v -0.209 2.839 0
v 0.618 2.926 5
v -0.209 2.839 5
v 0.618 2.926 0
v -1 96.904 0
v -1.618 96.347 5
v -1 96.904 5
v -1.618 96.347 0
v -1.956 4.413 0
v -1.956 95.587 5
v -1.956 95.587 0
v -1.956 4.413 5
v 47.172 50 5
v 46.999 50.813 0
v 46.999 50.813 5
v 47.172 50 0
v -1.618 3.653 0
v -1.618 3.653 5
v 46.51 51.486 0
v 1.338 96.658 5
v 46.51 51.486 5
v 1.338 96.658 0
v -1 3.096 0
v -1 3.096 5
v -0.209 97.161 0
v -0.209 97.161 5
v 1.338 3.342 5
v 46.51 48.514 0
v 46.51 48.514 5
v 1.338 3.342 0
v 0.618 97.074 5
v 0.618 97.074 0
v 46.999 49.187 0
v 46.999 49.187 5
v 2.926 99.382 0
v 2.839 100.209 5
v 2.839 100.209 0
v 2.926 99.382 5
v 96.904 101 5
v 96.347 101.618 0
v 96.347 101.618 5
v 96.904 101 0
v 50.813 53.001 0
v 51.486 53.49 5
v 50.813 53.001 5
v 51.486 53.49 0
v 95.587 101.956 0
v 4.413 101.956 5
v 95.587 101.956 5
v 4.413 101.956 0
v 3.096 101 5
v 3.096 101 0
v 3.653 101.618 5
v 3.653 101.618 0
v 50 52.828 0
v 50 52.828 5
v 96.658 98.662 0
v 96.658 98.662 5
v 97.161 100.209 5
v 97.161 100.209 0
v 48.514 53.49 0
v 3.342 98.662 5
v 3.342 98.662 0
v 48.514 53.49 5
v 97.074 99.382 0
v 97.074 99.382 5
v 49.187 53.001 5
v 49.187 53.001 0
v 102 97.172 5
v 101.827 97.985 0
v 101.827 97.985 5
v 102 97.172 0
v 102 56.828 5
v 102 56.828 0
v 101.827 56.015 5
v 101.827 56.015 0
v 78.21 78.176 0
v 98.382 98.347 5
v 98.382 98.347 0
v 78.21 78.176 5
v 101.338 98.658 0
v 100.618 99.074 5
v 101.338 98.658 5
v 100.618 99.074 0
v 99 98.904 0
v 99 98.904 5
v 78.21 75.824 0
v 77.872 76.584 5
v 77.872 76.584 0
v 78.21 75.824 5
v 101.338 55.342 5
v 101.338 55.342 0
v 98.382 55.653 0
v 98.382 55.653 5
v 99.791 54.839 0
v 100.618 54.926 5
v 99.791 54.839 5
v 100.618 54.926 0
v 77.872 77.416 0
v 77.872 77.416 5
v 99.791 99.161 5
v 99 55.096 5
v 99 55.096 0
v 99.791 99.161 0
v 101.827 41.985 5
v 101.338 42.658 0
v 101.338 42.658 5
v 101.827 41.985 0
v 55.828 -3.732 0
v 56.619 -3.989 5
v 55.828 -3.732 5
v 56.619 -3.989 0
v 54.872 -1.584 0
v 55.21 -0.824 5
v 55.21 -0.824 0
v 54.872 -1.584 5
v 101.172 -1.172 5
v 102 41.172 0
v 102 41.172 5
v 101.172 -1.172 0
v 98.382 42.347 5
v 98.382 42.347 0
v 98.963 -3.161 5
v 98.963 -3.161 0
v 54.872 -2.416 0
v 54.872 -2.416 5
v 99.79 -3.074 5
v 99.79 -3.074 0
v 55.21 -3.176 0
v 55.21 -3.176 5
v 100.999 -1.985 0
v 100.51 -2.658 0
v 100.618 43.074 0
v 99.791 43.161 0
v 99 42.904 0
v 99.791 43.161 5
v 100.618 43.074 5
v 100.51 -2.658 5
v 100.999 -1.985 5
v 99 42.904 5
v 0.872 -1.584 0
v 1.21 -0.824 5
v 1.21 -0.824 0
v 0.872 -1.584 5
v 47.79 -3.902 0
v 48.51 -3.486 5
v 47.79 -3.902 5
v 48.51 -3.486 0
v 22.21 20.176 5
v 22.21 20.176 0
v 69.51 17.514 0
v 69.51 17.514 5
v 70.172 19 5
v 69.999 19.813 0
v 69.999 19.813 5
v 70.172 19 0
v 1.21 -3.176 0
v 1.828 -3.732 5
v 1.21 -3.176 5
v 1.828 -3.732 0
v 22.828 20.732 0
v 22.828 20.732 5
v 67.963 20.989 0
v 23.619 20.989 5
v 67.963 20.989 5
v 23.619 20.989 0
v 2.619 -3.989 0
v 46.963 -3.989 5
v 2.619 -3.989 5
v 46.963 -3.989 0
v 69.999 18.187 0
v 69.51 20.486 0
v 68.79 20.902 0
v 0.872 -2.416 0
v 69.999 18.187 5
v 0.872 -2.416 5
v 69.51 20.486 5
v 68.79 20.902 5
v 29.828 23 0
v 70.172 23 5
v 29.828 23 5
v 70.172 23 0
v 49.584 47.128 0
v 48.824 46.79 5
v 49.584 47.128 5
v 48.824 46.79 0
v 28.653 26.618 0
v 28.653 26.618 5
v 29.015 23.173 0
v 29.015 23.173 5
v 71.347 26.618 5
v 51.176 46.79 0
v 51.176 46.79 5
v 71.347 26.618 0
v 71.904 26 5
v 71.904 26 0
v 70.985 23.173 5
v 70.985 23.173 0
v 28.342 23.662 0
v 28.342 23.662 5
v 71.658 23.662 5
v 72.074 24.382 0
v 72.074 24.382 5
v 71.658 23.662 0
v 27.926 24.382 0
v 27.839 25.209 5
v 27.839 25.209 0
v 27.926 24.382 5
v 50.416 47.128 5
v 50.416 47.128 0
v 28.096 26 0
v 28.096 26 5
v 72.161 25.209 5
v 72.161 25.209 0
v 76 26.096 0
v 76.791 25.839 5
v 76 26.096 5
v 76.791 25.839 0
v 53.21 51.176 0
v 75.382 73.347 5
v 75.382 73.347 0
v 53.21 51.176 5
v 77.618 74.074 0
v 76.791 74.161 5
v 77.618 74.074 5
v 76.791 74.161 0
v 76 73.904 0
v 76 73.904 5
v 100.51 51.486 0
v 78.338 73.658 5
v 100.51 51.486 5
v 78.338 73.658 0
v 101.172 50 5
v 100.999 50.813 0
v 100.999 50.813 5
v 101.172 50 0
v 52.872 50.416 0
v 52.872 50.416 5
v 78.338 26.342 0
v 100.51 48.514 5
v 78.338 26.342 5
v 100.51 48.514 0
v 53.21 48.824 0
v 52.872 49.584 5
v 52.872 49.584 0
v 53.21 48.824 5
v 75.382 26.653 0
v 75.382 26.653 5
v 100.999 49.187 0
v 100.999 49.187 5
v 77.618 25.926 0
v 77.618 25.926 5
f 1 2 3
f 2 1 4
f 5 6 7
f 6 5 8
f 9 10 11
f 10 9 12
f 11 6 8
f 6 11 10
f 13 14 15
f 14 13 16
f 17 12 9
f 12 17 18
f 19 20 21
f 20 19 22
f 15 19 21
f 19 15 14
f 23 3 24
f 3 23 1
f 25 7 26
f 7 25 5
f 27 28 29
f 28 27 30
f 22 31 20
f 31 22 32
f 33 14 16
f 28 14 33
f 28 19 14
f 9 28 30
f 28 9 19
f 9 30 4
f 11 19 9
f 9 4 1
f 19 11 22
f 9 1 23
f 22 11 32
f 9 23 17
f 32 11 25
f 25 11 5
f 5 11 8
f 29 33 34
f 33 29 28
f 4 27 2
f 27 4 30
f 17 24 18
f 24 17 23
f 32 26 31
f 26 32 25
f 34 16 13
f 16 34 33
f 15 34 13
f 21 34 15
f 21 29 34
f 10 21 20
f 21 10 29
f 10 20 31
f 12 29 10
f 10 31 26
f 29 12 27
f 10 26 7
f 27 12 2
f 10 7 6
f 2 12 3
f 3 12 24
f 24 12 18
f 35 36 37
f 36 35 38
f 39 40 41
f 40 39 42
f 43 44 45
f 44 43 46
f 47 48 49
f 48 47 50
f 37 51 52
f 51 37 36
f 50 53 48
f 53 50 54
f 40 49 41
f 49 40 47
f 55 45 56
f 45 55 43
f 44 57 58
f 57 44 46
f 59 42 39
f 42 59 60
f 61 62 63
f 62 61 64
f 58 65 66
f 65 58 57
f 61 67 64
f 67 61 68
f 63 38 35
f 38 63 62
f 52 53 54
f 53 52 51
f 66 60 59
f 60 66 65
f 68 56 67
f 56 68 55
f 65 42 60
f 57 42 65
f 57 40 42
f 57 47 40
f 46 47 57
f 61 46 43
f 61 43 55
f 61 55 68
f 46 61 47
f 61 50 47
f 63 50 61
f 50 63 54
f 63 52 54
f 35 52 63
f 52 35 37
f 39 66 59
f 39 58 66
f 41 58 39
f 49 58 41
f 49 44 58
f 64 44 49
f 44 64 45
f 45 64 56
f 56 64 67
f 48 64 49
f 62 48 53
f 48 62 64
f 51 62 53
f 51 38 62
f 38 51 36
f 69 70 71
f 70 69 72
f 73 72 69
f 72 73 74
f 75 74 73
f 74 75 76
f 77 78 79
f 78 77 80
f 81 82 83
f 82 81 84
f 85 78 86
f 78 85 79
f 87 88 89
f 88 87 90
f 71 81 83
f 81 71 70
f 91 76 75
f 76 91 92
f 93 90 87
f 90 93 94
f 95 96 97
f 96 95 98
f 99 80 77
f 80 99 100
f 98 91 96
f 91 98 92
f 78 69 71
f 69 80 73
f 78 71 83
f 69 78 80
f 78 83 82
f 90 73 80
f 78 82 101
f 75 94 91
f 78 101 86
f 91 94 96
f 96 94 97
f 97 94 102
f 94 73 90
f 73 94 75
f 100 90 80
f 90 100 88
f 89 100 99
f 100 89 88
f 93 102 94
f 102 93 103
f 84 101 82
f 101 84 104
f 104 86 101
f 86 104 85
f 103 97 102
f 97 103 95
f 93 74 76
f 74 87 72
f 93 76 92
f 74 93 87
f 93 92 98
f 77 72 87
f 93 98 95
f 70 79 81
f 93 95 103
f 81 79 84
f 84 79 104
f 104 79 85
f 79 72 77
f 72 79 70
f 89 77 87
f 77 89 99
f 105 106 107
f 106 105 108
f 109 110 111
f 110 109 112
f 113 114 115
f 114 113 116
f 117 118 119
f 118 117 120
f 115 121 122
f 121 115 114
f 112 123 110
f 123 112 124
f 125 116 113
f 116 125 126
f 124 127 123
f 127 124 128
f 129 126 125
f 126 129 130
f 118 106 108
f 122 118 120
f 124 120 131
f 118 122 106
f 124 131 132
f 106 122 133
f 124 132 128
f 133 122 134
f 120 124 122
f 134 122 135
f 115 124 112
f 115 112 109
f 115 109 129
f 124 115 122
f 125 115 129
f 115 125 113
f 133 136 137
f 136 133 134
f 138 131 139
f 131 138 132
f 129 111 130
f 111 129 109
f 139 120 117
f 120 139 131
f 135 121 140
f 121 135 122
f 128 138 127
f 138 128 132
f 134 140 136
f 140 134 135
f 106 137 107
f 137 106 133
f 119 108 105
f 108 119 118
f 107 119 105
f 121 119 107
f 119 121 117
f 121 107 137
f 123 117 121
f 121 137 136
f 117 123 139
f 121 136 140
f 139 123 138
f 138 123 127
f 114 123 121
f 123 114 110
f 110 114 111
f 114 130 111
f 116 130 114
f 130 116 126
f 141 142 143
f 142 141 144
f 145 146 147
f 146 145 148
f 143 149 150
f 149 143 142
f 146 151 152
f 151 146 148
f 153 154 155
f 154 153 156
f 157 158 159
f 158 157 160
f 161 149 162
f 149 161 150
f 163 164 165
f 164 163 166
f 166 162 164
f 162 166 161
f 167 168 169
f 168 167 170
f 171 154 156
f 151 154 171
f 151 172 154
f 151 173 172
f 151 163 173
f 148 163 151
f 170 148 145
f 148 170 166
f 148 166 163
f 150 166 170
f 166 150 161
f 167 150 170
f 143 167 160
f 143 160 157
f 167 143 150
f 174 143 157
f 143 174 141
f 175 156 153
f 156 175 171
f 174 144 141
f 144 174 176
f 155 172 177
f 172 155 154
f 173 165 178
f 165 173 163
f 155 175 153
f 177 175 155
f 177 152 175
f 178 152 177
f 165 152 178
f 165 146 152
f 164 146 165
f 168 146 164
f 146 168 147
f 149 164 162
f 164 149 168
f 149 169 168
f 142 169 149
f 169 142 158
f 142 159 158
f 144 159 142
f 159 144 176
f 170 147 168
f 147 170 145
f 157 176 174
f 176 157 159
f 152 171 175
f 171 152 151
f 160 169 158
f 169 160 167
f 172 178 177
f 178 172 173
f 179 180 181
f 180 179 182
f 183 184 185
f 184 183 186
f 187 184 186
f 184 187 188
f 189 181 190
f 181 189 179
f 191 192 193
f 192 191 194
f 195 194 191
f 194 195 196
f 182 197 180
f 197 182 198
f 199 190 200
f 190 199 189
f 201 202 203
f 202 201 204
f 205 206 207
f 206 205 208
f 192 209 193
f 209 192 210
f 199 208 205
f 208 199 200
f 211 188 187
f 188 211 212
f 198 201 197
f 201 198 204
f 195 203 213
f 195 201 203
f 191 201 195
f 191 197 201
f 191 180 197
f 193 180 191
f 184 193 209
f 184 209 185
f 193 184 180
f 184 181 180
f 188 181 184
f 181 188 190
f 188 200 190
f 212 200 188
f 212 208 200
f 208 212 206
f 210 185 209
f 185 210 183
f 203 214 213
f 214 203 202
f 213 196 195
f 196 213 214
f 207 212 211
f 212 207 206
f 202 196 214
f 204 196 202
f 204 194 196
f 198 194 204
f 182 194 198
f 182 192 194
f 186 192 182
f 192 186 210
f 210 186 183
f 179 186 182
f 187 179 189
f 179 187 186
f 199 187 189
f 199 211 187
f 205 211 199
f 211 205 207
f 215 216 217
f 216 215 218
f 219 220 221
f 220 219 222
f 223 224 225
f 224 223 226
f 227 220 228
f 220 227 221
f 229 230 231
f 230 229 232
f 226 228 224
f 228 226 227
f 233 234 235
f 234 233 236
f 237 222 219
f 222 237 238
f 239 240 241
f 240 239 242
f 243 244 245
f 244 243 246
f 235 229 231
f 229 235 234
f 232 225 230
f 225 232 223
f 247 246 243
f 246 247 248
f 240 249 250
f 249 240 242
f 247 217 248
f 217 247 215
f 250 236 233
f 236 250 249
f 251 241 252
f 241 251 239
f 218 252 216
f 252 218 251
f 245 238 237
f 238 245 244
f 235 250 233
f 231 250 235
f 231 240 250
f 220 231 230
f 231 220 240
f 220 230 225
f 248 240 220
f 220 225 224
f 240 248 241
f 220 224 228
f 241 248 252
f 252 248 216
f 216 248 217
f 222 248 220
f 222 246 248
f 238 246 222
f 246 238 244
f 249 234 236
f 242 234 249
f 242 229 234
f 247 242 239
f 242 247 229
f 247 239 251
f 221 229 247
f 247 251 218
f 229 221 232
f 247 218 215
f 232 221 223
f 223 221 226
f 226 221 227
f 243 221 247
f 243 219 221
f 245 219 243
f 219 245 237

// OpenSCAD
// Copyright 2018 Michael K Johnson
// Use allowed under Attribution 4.0 International (CC BY 4.0) license terms
// https://creativecommons.org/licenses/by/4.0/legalcode

f = 1.0; // X/Y scale factor relative to 100x100 assembled set
r = 2; // corner radius
h = 5; // height of tiles (not scaled by f)
s = 2; // separate the tiles by approximately s for printing

module tile(points, r=r, h=h) {
    hull() for (point=points) translate([point[0], point[1]])
        cylinder(r=r, h=h, $fn=15);
}
function offset(angle) = r / tan(angle/2);
module t1() {
    // largest triangle
    x1 = r;
    y1 = offset(45);
    y2 = 100 - offset(45);
    x3 = 50 - r*sqrt(2);
    tile([[x1, y1], [x1, y2], [x3, 50]]);
    %tile([[0, 0], [0, 100], [50, 50]], r=0.01, h=h+1);
}
module t2() {
    translate([0, 100, 0]) rotate([0, 0, -90]) t1();
}
module t3() {
    // smallest triangle
    x1 = 100-r;
    y1 = 50+offset(45);
    y2 = 100 - offset(45);
    x3 = 75 + r*sqrt(2);
    tile([[x1, y1], [x1, y2], [x3, 75]]);
    %tile([[100, 50], [100, 100], [75, 75]], r=0.01, h=h+1);
}
module t4() {
    // medium triangle
    x1 = 50+offset(45);
    y1 = r;
    x2 = 100 - r;
    y2 = 50 - offset(45);
    x3 = 100 - r*sqrt(2);
    y3 = r*sqrt(2);
    tile([[x1, y1], [x2, y2], [x3, y3]]);
    %tile([[50, 0], [100, 50], [100, 0]], r=0.01, h=h+1);
}
module t5() {
    // rhombus
    x1 = offset(45);
    y1 = r;
    x2 = 25 + offset(135);
    y2 = 25 - r;
    x3 = 75 - offset(45);
    y3 = y2;
    x4 = 50 - offset(135);
    y4 = r;
    tile([[x1, y1], [x2, y2], [x3, y3], [x4, y4]]);
    %tile([[0, 0], [25, 25], [75, 25], [50, 0]], r=0.01, h=h+1);
}
module t6() {
    translate([-25, 125, 0]) rotate([0, 0, -90]) t3();
}
module t7() {
    // square
    x1 = 75;
    y1 = 25+ r*sqrt(2);
    x2 = 50 + r*sqrt(2);
    y2 = 50;
    x3 = 75;
    y3 = 75 - r*sqrt(2);
    x4 = 100 - r*sqrt(2);
    y4 = 50;
    tile([[x1, y1], [x2, y2], [x3, y3], [x4, y4]]);
    %tile([[75, 25], [50, 50], [75, 75], [100, 50]], r=0.01, h=h+1);
}
module set() {
    // separate by some without trying to evenly distribute the space...
    translate([-s, 0]) t1();
    translate([0, s]) t2();
    translate([s, s]) t3();
    translate([s, -2*s]) t4();
    translate([-s, -2*s]) t5();
    translate([0, -s]) t6();
    translate([s, 0]) t7();
}
scale([f, f, 1]) set();
